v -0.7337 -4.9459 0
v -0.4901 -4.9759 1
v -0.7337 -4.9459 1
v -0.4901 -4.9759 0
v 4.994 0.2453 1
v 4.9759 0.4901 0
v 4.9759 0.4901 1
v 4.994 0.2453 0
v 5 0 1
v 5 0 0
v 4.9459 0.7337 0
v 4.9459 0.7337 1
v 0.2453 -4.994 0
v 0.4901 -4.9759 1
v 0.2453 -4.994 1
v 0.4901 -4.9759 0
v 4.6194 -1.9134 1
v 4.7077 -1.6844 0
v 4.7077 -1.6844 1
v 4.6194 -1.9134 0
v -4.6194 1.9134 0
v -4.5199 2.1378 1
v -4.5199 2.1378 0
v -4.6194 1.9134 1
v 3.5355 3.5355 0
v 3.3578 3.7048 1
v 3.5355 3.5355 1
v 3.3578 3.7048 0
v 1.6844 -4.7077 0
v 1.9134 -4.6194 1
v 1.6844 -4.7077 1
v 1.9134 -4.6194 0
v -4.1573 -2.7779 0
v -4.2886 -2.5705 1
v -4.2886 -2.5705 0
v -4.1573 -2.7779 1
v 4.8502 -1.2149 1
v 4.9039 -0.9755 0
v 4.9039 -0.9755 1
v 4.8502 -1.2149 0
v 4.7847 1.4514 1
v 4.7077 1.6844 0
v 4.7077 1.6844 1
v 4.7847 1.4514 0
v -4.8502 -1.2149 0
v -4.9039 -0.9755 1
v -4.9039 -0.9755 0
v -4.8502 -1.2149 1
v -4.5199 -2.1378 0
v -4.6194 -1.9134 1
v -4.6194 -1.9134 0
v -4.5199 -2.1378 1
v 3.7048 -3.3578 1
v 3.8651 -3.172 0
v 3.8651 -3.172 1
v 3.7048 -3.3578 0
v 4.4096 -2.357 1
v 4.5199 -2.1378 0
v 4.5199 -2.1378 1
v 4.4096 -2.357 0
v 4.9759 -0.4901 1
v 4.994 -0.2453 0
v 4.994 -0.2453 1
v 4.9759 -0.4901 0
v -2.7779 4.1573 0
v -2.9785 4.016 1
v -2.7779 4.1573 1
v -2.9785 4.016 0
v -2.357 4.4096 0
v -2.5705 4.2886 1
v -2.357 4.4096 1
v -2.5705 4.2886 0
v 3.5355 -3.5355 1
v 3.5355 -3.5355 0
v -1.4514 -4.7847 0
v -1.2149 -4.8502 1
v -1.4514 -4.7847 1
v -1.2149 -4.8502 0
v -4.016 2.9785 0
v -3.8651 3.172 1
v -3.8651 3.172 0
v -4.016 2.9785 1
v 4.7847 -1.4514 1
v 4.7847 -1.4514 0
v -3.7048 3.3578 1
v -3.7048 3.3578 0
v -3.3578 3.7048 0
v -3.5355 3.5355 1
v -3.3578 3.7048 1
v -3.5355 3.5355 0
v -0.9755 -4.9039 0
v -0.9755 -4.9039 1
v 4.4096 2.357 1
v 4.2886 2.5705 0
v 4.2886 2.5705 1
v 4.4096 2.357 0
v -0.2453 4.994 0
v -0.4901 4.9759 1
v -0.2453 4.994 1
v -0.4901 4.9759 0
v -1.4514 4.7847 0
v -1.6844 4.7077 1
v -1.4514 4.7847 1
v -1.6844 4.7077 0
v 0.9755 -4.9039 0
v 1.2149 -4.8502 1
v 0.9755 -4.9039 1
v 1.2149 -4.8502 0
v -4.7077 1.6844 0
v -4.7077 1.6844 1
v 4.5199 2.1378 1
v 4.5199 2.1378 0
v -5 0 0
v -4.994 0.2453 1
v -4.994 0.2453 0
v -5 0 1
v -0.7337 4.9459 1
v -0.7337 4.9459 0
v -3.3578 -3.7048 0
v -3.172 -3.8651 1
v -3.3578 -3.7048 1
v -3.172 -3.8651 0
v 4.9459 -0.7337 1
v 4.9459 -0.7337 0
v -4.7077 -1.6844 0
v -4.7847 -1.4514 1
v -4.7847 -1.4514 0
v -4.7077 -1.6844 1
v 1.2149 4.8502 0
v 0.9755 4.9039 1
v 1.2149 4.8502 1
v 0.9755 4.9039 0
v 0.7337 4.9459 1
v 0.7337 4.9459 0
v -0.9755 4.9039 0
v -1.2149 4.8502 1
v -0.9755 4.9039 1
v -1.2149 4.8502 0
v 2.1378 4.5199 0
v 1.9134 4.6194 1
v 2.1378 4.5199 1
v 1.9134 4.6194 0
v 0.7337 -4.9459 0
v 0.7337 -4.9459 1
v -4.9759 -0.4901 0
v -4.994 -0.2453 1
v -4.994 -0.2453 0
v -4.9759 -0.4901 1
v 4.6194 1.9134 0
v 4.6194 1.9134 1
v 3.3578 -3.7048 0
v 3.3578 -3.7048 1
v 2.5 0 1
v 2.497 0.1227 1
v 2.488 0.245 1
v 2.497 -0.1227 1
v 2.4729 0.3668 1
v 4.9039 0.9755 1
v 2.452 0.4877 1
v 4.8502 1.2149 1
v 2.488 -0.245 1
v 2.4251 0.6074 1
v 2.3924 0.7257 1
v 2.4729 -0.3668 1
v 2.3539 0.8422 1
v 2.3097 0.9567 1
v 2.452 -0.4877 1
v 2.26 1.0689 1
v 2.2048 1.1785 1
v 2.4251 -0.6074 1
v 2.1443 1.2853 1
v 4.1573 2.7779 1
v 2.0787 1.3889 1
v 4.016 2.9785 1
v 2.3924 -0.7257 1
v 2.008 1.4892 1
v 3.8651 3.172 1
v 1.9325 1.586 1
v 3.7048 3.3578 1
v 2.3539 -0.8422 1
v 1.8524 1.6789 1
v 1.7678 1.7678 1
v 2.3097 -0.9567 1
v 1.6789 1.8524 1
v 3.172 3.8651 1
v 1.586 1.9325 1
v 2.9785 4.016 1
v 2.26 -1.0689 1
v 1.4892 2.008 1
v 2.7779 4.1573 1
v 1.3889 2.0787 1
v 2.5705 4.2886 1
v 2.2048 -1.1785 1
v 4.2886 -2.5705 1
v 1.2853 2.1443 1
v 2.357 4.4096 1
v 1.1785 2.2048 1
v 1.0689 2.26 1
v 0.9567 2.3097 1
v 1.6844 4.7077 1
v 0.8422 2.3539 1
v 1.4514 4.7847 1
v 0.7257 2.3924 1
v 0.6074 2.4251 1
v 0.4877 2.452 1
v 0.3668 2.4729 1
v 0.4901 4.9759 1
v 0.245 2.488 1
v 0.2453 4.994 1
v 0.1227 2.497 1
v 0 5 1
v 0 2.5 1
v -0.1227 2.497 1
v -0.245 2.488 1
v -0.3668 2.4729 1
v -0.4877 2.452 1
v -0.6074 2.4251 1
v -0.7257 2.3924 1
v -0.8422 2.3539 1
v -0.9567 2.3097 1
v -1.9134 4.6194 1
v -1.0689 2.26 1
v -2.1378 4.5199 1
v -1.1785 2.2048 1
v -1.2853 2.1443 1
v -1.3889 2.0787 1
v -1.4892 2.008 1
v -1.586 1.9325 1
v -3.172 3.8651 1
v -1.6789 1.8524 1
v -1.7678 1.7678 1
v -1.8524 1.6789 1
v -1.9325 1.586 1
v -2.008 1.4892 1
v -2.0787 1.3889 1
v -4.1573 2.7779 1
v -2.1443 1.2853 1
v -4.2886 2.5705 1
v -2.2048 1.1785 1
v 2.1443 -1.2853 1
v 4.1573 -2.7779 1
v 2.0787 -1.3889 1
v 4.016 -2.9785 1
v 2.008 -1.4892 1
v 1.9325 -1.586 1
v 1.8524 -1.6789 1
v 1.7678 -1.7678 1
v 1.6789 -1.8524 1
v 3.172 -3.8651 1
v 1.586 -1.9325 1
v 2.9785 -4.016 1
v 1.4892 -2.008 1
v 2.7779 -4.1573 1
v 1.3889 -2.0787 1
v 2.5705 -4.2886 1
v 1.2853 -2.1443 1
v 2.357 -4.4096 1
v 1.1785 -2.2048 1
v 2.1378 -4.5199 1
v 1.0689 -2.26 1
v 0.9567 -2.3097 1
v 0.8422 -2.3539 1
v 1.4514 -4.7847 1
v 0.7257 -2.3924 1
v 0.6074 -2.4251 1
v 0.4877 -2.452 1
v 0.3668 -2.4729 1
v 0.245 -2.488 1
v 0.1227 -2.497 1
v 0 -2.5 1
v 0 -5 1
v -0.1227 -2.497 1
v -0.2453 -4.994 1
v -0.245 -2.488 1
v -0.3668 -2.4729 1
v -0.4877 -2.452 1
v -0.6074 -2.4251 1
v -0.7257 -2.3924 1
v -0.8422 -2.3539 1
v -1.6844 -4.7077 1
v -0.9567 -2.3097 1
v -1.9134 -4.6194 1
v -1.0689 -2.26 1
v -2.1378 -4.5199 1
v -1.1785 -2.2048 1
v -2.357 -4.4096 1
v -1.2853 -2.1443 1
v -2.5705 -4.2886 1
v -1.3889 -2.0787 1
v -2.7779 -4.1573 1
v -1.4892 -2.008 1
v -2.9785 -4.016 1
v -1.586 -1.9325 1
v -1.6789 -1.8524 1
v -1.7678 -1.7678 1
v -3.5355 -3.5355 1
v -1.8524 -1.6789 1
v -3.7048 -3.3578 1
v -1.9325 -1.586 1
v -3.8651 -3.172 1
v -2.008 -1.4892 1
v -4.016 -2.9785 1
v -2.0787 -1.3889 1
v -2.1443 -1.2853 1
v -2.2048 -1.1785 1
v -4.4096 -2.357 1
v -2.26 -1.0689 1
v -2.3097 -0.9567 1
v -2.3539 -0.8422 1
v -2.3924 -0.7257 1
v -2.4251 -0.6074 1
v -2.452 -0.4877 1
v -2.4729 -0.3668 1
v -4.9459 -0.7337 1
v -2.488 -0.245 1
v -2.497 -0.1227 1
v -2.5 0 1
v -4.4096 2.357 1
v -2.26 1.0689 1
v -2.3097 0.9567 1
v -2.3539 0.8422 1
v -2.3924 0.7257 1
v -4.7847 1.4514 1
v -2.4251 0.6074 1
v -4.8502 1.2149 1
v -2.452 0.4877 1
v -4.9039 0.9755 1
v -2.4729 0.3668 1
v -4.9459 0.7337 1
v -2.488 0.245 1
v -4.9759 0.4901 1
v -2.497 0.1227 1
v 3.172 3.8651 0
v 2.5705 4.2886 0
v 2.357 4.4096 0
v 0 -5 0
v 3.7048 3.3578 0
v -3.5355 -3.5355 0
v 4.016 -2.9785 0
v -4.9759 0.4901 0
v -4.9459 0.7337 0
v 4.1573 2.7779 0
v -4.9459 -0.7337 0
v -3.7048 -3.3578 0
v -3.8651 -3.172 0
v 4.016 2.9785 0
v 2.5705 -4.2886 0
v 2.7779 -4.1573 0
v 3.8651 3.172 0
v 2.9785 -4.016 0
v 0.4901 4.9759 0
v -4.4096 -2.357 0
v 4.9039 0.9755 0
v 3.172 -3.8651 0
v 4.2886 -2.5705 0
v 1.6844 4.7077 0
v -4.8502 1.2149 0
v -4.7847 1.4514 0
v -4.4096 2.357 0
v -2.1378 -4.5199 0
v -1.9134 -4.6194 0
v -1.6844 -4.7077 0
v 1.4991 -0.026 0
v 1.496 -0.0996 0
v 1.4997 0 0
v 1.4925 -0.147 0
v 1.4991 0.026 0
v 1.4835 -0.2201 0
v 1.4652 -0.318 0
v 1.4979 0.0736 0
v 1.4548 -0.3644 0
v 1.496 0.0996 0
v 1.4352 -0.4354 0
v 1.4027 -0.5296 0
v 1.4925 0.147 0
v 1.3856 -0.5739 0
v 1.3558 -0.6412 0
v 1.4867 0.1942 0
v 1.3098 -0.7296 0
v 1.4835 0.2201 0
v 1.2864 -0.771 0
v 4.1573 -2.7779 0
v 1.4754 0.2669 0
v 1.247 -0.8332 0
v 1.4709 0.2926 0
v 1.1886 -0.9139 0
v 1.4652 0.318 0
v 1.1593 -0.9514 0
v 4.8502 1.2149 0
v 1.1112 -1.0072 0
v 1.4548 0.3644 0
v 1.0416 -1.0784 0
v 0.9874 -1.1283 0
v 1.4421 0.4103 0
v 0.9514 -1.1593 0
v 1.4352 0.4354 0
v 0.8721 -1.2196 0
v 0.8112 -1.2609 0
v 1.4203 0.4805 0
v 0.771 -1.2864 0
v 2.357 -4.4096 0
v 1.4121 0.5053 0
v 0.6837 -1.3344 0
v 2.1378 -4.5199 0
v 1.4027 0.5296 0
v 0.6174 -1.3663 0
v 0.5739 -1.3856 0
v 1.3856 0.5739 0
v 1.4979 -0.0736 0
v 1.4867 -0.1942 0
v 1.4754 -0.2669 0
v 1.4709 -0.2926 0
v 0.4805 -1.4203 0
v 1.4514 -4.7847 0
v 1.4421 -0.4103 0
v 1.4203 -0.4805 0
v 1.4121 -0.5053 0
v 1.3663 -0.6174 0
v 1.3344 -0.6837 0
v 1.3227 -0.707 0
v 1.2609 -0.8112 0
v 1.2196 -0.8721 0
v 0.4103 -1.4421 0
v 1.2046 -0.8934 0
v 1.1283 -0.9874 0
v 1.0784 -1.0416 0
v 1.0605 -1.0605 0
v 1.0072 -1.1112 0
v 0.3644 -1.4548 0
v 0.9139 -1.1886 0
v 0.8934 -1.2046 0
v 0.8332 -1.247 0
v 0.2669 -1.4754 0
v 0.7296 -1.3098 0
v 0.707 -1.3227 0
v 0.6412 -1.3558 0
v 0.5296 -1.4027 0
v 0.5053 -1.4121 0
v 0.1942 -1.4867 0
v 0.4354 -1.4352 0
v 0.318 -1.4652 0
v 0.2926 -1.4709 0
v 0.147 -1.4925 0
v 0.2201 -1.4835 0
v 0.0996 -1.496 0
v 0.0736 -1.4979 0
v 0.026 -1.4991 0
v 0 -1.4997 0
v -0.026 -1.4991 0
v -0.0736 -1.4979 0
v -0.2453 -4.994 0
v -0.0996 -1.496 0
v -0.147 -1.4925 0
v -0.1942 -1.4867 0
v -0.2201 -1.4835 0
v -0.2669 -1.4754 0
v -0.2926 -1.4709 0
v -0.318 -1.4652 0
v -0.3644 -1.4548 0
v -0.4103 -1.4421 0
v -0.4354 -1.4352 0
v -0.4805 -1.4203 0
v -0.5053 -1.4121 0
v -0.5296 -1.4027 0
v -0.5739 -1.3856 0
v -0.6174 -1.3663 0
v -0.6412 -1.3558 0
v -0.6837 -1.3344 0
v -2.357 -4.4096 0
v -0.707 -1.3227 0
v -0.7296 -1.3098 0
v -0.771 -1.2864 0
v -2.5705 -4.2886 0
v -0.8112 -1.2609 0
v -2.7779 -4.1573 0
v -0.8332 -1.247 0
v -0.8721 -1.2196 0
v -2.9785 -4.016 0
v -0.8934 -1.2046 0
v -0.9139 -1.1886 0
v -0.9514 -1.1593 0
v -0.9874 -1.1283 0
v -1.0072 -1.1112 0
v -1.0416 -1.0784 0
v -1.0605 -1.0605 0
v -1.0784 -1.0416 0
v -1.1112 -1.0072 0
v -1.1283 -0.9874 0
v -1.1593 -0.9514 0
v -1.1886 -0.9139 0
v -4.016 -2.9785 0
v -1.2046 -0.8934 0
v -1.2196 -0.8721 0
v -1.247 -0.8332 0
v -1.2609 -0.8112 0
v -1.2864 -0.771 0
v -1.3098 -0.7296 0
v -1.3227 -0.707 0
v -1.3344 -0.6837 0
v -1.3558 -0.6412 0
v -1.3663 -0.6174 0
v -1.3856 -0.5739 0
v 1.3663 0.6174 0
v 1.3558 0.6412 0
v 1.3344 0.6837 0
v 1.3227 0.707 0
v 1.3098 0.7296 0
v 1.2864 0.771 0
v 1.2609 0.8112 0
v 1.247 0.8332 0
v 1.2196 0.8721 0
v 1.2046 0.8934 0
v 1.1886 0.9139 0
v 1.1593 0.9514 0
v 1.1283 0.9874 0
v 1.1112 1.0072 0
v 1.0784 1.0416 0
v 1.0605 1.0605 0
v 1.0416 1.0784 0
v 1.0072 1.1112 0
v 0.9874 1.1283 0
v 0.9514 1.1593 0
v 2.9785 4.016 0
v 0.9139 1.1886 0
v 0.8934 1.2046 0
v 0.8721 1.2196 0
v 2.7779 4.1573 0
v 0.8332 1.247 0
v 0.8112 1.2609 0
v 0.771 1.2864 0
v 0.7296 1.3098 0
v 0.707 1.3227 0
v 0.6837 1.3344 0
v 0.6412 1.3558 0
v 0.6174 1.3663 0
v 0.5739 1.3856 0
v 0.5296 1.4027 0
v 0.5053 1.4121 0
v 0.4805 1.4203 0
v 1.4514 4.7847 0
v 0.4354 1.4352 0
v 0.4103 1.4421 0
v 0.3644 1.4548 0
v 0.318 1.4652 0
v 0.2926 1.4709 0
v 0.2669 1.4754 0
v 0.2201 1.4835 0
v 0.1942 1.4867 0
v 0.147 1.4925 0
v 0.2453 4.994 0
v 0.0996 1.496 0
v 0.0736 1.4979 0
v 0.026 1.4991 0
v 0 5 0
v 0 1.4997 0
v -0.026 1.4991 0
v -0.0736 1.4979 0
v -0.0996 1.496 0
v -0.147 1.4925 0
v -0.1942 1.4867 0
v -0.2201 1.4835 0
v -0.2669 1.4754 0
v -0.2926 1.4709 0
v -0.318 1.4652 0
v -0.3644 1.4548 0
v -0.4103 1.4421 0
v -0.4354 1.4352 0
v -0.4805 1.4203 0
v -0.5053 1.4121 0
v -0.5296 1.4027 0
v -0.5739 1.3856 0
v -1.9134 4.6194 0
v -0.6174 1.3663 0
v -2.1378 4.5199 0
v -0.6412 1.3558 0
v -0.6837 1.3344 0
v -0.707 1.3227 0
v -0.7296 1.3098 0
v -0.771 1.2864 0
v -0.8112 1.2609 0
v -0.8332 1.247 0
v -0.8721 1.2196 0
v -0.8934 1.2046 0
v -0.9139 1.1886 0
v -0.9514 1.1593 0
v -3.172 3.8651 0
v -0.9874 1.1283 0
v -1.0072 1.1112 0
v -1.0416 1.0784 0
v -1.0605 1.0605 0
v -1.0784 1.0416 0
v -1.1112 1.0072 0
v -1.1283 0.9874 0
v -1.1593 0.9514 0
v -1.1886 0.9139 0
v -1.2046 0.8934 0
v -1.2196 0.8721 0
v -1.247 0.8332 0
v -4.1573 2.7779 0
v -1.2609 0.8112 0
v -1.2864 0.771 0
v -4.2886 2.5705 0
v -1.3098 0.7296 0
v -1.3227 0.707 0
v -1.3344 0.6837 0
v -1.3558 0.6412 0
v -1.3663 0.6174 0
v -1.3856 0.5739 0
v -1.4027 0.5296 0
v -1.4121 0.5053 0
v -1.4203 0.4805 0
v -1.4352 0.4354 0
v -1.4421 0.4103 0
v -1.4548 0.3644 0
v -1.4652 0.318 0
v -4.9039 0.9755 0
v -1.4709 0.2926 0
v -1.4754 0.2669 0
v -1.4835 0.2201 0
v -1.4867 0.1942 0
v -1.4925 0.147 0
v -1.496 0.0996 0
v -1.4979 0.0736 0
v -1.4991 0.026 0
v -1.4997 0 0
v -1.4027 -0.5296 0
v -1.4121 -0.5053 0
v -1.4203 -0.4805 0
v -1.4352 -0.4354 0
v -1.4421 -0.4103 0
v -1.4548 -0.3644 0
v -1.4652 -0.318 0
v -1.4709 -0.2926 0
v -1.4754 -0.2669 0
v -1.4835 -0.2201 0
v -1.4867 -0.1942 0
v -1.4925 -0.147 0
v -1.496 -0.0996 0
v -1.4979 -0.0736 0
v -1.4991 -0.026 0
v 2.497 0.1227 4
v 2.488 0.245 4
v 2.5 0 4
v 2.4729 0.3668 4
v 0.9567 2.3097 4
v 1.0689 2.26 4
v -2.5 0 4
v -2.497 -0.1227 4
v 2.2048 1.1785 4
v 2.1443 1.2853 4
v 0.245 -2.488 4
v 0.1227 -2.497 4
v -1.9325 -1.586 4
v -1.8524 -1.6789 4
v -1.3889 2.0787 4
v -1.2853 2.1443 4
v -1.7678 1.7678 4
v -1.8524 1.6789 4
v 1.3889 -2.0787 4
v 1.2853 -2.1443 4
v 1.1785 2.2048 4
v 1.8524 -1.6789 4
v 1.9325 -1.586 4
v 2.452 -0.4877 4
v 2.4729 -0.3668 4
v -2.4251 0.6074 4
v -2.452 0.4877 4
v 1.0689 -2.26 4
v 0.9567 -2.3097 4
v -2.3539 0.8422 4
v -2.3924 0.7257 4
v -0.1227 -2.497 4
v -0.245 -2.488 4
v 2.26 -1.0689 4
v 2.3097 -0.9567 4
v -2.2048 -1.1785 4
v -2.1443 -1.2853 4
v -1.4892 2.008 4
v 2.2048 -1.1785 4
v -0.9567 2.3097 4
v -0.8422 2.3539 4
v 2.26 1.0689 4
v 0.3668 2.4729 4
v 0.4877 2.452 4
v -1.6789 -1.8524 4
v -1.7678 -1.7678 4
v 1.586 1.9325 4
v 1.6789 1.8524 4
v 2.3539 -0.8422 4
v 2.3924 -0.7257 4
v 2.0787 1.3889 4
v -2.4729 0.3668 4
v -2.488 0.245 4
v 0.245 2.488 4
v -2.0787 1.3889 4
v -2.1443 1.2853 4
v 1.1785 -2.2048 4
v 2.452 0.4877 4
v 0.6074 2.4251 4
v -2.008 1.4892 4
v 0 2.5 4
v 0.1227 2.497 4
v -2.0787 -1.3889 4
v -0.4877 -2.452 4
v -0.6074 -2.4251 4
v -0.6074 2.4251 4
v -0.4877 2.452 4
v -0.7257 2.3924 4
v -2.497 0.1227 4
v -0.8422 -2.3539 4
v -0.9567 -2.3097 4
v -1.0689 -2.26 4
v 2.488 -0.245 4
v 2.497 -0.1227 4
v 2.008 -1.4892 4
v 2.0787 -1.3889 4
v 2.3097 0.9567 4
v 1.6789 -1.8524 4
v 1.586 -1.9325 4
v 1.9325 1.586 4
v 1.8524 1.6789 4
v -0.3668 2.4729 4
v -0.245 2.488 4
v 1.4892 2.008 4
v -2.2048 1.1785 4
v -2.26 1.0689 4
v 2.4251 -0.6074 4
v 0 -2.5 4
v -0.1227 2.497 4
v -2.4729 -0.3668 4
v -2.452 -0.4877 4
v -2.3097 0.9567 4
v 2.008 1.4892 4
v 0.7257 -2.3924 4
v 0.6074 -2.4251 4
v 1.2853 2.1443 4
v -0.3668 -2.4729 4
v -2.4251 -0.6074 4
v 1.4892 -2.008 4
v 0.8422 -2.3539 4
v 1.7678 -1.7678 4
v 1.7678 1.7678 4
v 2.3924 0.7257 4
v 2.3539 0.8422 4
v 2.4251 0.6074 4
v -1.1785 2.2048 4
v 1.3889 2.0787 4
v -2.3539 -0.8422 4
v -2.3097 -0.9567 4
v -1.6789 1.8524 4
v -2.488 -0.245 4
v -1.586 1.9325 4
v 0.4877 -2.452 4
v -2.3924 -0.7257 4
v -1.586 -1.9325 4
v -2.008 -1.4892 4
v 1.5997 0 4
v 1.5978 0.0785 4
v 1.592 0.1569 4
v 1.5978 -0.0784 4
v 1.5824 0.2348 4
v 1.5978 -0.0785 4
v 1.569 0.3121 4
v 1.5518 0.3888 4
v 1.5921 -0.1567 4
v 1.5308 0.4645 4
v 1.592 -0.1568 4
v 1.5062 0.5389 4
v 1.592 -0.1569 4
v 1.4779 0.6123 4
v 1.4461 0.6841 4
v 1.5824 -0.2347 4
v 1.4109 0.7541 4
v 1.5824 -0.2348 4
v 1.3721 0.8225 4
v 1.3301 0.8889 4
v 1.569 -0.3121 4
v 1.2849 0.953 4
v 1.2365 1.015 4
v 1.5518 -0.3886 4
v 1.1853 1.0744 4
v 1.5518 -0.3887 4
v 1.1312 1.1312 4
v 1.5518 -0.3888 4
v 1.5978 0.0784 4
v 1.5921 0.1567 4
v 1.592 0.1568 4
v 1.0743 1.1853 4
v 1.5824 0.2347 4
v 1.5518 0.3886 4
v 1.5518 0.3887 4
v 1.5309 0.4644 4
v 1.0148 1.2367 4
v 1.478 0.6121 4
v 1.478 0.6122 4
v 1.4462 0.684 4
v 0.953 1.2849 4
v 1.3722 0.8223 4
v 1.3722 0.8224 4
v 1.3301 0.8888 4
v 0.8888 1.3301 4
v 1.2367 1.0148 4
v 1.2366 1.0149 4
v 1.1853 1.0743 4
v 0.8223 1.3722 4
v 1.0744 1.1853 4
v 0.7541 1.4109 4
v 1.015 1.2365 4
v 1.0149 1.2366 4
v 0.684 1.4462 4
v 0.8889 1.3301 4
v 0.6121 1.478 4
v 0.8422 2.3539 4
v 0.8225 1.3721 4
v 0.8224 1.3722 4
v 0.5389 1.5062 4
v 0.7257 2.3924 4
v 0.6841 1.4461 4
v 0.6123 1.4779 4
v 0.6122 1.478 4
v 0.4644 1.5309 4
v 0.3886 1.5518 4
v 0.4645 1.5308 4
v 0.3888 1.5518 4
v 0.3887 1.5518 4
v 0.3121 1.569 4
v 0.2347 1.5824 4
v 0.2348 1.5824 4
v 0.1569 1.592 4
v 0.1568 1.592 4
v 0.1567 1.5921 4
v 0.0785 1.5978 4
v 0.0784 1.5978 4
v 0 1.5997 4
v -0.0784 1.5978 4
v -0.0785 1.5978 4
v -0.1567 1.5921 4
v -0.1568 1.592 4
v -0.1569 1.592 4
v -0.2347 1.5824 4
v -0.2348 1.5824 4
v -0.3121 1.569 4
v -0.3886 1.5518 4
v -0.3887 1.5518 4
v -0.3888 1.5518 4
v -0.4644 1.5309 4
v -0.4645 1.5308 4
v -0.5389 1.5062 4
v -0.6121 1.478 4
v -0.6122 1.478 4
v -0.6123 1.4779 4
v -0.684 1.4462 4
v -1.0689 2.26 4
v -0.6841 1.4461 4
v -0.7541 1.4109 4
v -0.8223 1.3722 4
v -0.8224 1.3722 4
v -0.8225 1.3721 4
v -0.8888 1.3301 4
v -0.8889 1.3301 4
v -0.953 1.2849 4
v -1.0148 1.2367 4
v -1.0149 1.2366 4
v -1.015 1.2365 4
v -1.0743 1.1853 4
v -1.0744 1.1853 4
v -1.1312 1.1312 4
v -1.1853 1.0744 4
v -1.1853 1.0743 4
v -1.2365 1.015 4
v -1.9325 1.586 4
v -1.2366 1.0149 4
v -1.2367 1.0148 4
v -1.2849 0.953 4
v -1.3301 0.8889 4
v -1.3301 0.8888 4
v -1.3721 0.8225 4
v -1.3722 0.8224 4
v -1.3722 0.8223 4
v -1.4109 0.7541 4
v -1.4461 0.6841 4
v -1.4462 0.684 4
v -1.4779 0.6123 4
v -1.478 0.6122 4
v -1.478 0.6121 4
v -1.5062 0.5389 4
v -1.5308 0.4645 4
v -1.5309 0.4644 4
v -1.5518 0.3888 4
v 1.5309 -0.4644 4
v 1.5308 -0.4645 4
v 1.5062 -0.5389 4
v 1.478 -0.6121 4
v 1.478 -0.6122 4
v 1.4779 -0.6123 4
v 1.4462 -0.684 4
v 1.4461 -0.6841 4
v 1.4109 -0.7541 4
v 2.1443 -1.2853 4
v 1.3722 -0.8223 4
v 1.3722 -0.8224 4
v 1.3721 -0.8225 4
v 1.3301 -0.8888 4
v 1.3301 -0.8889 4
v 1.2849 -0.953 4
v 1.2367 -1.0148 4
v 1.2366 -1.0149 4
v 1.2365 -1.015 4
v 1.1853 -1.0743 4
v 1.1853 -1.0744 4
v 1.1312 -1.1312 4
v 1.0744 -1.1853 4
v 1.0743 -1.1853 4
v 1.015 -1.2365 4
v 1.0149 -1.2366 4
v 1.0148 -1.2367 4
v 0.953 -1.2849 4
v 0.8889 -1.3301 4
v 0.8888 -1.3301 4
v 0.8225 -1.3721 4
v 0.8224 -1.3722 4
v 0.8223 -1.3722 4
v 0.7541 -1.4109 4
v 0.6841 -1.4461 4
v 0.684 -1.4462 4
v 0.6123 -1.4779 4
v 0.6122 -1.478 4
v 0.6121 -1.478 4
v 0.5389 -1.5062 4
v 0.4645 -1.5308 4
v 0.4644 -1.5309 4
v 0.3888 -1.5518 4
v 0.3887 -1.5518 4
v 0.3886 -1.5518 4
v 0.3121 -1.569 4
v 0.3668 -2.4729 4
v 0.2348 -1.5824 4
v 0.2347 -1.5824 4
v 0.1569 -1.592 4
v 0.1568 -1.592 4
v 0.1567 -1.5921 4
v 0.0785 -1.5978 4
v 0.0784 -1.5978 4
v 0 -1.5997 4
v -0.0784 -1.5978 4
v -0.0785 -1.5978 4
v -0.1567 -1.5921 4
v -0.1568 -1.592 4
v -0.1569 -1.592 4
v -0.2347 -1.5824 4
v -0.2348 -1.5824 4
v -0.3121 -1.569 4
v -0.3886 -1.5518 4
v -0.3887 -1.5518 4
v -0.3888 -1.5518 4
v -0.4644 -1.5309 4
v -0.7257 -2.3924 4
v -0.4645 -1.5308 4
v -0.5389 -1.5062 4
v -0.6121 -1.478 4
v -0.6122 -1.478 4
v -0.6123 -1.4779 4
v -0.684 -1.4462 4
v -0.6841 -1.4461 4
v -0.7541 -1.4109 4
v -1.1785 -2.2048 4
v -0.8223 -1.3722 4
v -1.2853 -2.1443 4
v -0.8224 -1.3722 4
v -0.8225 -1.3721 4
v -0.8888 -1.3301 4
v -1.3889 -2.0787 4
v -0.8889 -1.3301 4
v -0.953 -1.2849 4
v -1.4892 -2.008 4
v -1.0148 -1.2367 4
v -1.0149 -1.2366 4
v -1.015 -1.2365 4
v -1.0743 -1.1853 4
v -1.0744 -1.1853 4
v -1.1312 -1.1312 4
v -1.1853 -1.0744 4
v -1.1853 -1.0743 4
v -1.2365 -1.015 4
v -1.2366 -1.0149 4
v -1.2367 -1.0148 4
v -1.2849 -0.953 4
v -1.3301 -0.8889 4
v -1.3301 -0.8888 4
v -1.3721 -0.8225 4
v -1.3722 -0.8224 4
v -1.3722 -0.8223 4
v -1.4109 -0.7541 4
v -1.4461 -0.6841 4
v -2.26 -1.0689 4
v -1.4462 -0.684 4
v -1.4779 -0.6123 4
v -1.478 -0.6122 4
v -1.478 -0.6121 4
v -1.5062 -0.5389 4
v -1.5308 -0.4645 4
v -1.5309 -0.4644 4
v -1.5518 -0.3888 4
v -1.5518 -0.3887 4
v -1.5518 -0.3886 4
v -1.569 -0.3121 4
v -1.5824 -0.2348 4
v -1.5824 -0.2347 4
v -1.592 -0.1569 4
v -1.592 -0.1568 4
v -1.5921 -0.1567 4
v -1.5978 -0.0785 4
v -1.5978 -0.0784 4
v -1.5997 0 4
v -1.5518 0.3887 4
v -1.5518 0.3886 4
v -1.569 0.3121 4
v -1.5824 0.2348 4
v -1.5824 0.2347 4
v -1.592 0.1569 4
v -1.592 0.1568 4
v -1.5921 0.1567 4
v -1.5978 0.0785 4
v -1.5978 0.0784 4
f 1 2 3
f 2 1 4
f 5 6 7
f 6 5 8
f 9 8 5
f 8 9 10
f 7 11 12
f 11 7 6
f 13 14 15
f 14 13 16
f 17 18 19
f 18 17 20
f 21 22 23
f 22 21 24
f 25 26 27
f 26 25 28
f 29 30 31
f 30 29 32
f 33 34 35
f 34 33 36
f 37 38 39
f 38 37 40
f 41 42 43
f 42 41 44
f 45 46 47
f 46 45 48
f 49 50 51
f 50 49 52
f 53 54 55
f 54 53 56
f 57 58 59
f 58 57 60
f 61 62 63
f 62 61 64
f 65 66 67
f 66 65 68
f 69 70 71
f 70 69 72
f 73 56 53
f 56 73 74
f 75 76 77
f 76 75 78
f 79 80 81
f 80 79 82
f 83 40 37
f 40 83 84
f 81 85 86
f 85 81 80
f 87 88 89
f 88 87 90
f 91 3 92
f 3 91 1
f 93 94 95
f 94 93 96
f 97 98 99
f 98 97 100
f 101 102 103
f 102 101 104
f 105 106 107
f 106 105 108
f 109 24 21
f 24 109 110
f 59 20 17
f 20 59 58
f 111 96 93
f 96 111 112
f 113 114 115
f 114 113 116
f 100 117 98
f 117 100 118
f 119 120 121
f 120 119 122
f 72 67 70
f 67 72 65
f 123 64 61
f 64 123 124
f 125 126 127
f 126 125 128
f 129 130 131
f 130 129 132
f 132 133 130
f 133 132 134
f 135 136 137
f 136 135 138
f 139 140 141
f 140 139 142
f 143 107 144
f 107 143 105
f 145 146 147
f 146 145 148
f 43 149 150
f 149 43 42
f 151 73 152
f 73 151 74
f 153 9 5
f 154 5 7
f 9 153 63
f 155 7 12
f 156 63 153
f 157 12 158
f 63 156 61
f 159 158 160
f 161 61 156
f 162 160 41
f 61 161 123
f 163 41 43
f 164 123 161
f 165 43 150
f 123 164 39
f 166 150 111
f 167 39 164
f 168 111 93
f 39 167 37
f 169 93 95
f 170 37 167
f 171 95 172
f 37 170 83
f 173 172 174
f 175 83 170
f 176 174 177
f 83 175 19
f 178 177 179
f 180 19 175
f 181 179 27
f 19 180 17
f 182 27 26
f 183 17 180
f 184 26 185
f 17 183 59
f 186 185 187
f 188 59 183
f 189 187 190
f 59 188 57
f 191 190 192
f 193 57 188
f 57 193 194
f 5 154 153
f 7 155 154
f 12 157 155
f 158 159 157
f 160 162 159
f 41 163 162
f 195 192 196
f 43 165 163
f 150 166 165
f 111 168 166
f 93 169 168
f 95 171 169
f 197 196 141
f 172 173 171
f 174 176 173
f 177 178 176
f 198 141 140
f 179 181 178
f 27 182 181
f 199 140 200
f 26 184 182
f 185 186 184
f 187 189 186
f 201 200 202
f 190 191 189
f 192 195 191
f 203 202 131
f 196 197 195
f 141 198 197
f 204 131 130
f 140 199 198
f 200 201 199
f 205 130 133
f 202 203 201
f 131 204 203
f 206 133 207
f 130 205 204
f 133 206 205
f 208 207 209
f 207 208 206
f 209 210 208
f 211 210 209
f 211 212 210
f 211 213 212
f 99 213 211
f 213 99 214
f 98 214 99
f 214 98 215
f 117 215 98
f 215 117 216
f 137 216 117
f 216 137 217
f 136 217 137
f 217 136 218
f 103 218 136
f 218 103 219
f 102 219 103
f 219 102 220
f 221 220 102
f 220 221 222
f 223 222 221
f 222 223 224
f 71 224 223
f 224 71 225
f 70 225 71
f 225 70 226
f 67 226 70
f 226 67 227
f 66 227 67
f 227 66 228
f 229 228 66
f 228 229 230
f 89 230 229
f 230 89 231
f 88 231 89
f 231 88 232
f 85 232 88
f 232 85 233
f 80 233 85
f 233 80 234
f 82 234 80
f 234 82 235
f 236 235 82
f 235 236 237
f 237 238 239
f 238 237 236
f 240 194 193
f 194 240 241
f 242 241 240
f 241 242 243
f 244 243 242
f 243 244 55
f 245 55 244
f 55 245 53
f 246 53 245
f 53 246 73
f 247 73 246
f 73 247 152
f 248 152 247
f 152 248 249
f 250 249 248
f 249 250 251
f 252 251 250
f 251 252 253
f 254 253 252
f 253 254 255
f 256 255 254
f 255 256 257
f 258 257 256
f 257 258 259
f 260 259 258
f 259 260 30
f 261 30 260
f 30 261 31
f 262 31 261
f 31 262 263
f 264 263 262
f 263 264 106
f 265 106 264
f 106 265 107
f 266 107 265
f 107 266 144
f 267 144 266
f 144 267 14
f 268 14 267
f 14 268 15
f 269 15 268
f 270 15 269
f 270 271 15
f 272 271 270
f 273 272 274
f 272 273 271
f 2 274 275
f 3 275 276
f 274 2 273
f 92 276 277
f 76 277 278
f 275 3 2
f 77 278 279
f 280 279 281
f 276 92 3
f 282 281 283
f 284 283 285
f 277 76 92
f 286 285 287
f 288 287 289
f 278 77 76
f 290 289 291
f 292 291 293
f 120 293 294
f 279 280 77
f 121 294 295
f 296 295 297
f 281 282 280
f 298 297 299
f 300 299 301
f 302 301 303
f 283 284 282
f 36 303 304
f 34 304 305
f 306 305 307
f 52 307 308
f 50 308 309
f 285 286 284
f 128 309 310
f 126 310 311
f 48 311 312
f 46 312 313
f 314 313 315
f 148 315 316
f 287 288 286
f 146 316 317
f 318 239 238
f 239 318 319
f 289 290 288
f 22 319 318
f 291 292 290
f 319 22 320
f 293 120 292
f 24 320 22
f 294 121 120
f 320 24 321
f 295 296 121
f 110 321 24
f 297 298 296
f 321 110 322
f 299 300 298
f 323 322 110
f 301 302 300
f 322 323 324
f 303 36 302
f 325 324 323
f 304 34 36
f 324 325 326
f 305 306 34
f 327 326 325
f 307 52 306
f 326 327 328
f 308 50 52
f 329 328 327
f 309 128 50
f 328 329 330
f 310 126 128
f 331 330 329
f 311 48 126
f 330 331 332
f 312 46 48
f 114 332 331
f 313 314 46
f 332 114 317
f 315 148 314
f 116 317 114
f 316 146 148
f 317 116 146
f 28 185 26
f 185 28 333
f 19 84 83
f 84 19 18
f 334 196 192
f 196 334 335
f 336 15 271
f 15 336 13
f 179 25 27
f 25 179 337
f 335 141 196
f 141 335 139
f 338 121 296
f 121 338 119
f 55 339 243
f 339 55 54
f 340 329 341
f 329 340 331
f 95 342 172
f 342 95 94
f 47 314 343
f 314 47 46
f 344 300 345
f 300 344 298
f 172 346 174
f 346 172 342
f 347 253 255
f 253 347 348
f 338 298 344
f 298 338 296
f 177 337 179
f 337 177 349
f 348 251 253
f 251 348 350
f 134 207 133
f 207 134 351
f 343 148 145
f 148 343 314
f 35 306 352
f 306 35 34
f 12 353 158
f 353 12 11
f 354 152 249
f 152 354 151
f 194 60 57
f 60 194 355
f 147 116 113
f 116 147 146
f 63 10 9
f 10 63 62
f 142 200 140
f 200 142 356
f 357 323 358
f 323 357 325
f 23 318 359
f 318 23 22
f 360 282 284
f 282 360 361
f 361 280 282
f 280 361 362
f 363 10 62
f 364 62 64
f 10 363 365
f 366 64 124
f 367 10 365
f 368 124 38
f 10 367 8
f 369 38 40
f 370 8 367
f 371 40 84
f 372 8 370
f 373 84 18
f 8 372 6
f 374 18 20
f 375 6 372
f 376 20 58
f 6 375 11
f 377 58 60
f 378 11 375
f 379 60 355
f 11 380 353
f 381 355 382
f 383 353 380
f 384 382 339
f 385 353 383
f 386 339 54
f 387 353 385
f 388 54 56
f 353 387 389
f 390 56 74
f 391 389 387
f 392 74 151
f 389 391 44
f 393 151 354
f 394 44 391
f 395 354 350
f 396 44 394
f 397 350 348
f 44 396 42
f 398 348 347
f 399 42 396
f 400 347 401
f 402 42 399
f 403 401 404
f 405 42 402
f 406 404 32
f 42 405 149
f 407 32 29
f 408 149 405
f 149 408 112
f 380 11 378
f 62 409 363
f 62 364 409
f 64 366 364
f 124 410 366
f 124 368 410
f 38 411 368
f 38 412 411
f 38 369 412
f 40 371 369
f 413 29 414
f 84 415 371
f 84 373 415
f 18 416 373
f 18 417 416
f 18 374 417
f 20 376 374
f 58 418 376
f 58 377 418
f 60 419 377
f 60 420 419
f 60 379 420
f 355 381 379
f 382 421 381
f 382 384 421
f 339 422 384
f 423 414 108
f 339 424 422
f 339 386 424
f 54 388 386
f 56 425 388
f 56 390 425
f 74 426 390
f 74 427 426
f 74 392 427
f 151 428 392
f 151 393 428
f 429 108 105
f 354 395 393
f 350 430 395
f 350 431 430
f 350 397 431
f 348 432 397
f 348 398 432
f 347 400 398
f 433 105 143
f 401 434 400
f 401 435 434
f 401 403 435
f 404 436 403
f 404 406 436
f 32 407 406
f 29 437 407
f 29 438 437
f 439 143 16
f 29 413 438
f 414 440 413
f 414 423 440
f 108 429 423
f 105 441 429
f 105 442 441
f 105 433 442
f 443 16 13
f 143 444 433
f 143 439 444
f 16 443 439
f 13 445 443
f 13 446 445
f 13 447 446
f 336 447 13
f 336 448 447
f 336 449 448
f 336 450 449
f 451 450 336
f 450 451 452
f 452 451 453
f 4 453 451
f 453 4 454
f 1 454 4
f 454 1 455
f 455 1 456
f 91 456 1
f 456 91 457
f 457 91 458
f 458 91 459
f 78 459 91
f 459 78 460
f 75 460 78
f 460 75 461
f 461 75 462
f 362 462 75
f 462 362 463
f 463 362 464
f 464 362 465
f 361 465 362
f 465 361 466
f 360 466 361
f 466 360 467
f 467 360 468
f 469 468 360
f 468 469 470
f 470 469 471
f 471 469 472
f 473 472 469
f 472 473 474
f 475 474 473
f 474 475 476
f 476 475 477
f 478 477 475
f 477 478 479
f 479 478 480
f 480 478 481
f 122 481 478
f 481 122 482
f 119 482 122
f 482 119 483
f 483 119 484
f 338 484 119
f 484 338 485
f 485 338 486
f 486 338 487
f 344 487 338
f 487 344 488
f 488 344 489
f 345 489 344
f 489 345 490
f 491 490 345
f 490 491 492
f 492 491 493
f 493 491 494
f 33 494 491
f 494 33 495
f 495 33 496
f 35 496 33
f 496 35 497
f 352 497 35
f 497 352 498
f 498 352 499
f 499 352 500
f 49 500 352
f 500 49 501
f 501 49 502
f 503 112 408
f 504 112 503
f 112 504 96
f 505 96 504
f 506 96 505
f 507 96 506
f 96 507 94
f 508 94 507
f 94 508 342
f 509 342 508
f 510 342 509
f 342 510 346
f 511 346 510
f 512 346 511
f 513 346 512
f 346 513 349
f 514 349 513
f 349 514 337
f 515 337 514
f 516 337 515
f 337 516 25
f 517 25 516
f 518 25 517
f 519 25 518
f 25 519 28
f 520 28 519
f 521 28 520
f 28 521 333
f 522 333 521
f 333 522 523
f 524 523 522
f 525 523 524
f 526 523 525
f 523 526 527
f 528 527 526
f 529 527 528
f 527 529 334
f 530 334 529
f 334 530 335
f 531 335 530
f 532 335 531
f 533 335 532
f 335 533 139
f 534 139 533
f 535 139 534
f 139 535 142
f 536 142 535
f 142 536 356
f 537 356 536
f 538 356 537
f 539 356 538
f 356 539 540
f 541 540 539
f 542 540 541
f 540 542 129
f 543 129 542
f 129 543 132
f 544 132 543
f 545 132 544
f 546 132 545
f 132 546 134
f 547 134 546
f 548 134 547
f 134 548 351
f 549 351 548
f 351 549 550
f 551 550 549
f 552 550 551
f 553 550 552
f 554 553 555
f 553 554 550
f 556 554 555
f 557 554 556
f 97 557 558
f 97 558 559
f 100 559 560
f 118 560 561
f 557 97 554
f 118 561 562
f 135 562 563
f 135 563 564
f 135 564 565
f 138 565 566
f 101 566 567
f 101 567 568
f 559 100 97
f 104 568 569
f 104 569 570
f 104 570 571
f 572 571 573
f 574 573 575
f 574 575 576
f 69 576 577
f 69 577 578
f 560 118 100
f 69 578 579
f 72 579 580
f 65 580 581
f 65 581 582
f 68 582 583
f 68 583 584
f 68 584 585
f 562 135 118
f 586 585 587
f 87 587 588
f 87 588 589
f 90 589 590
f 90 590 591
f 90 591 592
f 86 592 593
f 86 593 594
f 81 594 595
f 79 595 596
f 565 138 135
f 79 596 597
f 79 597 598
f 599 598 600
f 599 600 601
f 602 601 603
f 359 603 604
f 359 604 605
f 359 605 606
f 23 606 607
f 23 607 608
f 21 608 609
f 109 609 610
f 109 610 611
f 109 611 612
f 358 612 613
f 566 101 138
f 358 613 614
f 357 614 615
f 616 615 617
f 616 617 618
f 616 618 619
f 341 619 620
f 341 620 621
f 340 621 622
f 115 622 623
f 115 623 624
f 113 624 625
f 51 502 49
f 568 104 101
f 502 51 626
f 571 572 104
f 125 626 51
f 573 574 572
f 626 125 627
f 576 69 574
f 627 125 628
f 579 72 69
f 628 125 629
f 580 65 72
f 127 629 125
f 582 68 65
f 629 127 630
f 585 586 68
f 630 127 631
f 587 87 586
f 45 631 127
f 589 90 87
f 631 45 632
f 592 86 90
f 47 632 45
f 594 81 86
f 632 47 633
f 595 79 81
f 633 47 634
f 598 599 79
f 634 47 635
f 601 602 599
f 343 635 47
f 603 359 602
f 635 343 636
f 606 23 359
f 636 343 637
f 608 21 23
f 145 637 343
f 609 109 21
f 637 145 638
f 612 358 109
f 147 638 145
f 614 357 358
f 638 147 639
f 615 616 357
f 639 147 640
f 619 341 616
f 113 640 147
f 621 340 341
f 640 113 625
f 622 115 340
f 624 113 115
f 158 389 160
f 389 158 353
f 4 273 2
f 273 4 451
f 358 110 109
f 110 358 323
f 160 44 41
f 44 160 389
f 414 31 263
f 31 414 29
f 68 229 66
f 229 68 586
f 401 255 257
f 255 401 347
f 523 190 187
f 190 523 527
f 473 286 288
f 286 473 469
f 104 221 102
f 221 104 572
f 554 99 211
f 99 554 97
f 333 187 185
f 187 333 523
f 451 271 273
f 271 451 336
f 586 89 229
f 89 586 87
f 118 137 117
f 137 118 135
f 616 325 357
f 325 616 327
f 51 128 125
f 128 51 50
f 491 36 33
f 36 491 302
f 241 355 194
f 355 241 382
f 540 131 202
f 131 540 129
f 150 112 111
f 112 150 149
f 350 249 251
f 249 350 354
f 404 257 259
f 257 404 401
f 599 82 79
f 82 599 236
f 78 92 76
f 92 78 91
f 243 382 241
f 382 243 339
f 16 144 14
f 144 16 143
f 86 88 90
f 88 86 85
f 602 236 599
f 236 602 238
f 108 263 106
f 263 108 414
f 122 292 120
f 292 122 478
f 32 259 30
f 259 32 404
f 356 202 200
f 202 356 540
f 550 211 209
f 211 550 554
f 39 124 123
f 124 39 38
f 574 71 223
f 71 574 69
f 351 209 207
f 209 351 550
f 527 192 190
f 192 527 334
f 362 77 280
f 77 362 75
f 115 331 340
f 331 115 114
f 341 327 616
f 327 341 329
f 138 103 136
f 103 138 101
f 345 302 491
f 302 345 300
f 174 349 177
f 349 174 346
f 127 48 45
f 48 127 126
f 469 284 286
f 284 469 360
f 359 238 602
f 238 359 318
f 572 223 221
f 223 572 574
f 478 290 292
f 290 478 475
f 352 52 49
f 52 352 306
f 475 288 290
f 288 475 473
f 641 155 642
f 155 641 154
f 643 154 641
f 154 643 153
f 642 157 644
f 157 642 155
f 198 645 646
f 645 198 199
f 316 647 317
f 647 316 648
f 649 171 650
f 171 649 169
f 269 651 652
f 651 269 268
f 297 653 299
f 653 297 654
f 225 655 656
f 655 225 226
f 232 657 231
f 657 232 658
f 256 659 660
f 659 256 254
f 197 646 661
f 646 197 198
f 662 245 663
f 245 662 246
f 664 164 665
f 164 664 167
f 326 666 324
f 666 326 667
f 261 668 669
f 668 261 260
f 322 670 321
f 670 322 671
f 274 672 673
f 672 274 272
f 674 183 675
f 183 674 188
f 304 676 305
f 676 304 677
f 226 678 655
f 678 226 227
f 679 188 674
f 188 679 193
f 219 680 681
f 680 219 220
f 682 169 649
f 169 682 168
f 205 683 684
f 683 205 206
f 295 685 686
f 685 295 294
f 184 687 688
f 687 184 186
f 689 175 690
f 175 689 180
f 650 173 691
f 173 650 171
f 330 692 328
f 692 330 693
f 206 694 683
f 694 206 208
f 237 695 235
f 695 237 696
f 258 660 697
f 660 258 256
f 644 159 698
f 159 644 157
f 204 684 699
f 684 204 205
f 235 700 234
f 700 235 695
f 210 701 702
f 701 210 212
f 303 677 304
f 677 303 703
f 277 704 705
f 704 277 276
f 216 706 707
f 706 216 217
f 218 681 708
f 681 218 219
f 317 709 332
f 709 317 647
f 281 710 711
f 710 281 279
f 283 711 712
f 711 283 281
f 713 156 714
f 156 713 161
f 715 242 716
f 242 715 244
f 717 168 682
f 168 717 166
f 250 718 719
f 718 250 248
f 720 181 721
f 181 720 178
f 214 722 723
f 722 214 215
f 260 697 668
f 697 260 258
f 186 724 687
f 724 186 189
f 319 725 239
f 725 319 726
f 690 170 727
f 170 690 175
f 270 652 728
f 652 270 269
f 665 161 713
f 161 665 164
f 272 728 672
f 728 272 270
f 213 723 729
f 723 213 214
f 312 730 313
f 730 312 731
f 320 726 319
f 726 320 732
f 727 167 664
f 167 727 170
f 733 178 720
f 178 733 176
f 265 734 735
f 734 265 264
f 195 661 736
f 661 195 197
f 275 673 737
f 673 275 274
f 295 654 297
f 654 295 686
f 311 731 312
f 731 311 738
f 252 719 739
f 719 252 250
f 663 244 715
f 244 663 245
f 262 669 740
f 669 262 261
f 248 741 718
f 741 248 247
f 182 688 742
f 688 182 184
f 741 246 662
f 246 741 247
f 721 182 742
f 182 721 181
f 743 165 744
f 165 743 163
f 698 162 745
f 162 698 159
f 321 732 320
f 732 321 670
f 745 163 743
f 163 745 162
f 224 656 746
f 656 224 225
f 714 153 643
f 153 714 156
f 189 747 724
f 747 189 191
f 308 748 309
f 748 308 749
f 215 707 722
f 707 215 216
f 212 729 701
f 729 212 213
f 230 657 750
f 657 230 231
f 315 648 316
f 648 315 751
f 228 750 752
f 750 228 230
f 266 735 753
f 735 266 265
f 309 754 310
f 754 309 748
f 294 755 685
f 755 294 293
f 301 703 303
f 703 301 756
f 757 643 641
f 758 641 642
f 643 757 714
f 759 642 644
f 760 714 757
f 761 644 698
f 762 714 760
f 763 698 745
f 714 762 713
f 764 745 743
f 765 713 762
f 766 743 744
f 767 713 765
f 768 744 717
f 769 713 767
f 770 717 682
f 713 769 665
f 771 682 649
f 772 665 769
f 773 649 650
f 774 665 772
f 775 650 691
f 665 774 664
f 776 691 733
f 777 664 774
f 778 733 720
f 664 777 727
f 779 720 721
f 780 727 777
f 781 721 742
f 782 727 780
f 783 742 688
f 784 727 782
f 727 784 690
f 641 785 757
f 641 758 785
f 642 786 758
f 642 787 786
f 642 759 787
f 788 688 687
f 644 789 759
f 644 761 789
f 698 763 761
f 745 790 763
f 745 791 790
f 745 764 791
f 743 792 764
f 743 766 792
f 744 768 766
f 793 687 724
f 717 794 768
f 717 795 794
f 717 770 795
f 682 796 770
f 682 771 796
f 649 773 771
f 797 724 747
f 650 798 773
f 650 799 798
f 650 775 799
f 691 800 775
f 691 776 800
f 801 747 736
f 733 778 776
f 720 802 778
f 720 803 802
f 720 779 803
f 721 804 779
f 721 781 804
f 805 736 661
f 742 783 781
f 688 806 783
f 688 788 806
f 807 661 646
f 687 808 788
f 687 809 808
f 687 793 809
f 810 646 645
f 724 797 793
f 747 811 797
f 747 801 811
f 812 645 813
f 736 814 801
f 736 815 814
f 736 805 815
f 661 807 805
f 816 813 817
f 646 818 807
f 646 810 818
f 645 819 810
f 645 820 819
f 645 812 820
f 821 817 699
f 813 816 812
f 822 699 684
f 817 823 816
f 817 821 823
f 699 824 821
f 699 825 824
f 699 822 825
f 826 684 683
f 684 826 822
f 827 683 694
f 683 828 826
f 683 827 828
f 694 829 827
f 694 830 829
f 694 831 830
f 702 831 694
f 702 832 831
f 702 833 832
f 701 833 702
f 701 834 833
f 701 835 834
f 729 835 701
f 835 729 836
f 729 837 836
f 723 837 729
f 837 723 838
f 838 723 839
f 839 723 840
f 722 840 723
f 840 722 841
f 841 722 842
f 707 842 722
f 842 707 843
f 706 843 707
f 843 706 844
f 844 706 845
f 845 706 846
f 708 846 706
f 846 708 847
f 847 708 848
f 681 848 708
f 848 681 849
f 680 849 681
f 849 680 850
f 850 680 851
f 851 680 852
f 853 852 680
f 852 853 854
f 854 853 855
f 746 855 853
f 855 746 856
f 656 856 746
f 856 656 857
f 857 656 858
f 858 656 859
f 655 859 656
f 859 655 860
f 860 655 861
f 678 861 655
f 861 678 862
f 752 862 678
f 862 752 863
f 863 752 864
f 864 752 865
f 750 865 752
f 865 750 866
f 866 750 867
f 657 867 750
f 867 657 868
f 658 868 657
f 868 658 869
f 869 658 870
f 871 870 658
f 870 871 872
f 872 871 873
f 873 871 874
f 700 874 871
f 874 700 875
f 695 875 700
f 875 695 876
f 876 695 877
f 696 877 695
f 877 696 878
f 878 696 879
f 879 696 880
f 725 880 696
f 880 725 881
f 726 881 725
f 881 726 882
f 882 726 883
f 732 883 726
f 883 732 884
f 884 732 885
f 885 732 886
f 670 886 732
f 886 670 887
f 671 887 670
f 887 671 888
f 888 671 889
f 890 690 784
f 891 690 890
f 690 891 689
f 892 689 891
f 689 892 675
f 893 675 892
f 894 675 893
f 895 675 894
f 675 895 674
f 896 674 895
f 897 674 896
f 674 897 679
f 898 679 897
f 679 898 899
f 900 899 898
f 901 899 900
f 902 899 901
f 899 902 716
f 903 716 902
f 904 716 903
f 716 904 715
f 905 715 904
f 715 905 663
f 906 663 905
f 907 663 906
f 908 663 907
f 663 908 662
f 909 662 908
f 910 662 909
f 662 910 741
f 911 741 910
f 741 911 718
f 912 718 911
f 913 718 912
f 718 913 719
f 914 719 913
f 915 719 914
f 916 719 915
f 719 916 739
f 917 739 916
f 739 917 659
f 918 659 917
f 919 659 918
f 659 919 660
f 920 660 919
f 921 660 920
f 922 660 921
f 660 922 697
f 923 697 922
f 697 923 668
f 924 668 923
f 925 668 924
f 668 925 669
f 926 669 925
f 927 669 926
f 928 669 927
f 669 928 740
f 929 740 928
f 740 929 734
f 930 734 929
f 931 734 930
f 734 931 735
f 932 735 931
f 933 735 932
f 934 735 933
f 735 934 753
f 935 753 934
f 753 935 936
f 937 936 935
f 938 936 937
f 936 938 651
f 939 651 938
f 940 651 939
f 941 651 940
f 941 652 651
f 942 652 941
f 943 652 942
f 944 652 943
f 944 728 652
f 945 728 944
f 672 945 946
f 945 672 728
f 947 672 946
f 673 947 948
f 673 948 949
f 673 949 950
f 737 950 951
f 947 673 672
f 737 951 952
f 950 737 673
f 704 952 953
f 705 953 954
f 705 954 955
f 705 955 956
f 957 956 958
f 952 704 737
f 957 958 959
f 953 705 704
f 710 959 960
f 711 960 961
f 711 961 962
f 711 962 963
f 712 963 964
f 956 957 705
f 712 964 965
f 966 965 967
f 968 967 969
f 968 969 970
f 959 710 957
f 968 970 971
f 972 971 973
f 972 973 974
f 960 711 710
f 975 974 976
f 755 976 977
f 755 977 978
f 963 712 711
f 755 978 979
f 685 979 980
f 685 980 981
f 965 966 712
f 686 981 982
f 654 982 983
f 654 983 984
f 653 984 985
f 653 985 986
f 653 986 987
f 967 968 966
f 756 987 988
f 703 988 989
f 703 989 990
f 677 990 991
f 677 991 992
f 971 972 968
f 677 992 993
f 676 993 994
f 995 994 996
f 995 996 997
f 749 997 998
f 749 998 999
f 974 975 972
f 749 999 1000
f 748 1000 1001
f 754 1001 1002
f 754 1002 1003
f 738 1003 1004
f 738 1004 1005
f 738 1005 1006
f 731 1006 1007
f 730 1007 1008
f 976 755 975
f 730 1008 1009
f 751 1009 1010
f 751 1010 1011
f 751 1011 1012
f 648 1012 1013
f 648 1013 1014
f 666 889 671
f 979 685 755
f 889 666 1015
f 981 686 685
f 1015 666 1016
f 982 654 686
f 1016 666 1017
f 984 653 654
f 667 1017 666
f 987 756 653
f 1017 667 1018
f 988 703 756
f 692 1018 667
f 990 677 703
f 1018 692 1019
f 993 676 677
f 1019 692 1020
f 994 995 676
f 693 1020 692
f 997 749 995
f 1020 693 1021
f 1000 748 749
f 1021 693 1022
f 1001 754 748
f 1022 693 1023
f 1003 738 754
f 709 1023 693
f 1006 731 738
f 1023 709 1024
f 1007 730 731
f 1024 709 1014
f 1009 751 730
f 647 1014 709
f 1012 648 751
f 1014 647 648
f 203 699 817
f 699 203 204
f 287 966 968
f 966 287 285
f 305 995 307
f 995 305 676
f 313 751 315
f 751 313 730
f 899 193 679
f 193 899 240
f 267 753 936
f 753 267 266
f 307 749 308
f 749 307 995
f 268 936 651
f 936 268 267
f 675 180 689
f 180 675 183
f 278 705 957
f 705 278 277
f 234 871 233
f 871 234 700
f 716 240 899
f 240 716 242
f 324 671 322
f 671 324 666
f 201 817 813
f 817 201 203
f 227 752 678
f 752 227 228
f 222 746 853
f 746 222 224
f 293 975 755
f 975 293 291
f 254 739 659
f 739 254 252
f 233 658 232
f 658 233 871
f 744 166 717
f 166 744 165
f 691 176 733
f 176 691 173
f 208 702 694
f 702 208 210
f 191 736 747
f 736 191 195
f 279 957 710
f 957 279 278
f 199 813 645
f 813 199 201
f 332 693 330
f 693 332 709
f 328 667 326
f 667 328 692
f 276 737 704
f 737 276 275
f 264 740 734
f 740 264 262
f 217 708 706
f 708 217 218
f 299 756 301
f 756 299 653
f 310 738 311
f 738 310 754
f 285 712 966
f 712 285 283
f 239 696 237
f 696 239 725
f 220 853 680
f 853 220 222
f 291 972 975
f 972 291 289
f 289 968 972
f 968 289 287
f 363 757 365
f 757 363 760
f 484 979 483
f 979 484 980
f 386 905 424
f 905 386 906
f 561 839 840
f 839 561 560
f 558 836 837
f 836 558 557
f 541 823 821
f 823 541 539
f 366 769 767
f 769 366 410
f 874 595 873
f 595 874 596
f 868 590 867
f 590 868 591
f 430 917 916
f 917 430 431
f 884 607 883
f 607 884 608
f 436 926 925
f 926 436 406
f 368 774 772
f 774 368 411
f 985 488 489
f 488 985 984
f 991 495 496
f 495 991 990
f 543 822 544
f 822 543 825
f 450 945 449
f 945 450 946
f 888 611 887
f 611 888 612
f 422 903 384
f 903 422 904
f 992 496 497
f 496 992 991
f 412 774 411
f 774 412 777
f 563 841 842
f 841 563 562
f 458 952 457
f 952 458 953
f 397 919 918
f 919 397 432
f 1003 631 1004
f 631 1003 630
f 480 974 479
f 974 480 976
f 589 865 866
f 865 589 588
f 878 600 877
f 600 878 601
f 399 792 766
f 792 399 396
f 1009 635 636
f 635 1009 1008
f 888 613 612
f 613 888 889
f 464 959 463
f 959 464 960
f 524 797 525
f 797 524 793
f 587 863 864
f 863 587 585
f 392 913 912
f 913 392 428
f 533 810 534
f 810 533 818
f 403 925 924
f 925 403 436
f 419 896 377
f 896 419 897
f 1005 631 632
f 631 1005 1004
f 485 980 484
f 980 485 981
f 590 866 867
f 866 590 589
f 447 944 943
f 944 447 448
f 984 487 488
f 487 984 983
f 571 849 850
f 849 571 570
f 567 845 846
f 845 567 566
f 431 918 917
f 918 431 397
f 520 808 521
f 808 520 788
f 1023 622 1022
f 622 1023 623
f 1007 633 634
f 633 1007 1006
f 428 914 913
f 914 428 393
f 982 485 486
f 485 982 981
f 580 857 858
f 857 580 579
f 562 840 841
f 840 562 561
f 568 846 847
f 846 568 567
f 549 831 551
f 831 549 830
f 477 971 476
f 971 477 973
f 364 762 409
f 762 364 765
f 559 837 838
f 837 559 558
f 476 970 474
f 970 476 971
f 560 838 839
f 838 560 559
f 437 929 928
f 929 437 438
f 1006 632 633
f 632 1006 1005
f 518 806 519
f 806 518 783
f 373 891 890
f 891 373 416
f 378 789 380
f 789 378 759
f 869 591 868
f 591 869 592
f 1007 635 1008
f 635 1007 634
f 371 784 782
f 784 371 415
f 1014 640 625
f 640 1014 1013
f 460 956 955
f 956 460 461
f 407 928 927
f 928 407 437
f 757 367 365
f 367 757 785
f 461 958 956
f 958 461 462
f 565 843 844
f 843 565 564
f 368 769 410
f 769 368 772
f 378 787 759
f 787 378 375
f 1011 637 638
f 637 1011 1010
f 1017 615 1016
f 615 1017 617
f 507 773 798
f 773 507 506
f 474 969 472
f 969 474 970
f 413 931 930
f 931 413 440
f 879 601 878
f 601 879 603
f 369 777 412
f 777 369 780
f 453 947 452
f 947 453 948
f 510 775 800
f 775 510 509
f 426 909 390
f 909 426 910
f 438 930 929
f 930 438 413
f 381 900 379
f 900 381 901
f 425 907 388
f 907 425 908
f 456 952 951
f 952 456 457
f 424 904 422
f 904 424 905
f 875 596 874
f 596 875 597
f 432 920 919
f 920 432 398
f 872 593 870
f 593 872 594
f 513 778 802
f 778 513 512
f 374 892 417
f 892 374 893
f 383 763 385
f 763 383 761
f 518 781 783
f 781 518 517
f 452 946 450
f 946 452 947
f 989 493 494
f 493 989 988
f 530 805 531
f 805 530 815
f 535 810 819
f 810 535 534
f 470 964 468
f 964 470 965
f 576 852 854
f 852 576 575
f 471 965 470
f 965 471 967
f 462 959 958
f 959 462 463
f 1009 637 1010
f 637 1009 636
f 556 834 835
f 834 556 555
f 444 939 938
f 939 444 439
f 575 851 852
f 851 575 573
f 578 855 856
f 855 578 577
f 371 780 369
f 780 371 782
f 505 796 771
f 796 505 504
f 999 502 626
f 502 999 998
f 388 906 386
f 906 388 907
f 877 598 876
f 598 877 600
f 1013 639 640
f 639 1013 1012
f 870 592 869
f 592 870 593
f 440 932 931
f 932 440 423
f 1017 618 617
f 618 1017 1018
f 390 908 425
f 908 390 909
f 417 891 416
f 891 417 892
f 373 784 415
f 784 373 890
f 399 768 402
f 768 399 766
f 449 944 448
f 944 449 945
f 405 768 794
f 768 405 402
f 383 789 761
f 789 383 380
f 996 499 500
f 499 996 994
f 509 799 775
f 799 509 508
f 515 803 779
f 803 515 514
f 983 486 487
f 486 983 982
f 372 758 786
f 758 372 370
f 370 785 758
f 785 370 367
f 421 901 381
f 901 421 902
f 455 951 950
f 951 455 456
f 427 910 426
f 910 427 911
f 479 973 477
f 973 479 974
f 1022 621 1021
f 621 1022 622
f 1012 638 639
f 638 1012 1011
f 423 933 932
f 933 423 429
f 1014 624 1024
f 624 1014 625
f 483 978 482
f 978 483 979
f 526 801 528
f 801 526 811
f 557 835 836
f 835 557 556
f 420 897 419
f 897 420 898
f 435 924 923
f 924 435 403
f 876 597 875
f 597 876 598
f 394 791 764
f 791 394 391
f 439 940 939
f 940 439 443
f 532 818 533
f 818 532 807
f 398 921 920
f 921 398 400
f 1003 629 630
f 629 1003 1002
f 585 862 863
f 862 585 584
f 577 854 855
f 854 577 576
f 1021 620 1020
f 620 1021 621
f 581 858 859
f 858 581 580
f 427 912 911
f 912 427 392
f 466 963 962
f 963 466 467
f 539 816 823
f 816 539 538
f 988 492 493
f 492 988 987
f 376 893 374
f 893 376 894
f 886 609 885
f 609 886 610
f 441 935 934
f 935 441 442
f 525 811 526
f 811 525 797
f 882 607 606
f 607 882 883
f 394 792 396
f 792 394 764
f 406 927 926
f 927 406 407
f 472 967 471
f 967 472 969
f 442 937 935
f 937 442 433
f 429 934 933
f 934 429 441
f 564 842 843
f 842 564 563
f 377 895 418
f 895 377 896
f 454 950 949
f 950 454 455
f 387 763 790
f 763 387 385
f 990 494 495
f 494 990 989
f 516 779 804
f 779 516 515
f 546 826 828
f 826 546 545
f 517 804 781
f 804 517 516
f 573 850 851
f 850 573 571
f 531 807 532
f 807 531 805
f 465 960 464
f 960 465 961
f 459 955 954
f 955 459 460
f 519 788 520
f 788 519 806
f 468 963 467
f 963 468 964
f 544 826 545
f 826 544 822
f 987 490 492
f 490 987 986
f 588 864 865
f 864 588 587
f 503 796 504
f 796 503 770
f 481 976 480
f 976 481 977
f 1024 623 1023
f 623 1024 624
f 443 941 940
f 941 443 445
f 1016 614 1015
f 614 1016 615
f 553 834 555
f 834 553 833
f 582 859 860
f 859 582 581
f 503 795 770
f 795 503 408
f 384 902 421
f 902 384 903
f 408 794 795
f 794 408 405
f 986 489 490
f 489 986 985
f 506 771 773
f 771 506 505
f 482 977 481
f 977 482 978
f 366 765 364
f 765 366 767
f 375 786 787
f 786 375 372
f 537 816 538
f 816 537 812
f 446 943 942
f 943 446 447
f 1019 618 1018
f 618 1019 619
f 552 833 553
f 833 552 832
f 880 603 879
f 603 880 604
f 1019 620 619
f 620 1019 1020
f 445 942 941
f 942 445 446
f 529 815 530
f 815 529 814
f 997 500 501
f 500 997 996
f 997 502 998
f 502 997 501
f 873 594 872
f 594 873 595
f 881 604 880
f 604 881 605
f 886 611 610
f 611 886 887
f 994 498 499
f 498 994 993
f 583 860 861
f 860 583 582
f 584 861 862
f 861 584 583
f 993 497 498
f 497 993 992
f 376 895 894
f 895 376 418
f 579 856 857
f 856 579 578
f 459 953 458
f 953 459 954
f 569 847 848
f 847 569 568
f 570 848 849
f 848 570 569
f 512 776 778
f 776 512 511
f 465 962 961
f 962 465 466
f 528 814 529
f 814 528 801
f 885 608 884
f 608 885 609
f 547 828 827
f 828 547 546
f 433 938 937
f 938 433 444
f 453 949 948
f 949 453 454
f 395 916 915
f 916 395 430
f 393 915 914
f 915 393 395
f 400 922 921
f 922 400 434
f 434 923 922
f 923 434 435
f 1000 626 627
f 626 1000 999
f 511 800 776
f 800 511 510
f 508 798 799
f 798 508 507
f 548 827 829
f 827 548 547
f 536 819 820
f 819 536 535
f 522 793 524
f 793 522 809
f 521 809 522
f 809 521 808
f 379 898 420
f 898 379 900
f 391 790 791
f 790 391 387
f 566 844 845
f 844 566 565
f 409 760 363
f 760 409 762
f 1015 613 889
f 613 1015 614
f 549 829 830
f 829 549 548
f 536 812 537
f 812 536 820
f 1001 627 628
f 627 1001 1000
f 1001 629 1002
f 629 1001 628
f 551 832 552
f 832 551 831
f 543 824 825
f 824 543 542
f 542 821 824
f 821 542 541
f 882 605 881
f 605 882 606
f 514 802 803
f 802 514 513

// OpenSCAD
// file: ../../envelopes/screw-envelope.scad
screwEnvelope();

module screwEnvelope(
    center_screwed_position = false,
    diameter_ajustment_head = 0.2,
    diameter_ajustment_screw = -0.1,
    _fn = 128
) {

    head_height = 2.1;
    middle_height = 0.9;
    bottom_height = 6;

    z_centring_translation = center_screwed_position ? -head_height -middle_height : 0;

    translate([0,0, z_centring_translation])
        union() {
            cylinder(
                r = 7.95 / 2 + diameter_ajustment_head,
                h = head_height + middle_height,
                $fn = _fn);
            translate([0, 0, head_height + middle_height])
                cylinder(
                    r1 = 3.4 / 2 + diameter_ajustment_screw,
                    r2 = 3.1 / 2 + diameter_ajustment_screw,
                    h = bottom_height,
                    $fn = _fn
                );
        }
}
// file: articulation-axis.scad
articulationAxisSubPiece();

module articulationAxisSubPiece(
    base_diameter,
    base_height,
    axis_diameter,
    axis_height,
    _fn = 64
) {
    // servo body r = 11.8 / 2
    // servo axis r = 4.6 / 2

    debug_colors = true;
    base_color = "red";
    axis_color = "green";

    color(debug_colors ? base_color : "")
    cylinder(
        r = base_diameter / 2,
        h = base_height,
        $fn = _fn
    );
    translate(
        [
            0,
            0,
            base_height
        ])
        color(debug_colors ? axis_color : "")
        cylinder(
            r = axis_diameter / 2,
            h = axis_height,
            $fn = _fn
        );

}
// main file
use <./articulation-axis.scad>
use <../../envelopes/screw-envelope.scad>

articulationAxisScrewSubPiece();

module articulationAxisScrewSubPiece(
    base_diameter = 10,
    base_height = 1,
    axis_diameter = 5,
    axis_height = 3,
    _fn = 128
) {

    difference() {
        articulationAxisSubPiece(
            base_diameter = base_diameter,
            base_height = base_height,
            axis_diameter = axis_diameter,
            axis_height = axis_height,
            _fn = _fn
        );

        translate([0, 0, 7.01])
            rotate([180, 0, 0])
                screwEnvelope();
    }
}
